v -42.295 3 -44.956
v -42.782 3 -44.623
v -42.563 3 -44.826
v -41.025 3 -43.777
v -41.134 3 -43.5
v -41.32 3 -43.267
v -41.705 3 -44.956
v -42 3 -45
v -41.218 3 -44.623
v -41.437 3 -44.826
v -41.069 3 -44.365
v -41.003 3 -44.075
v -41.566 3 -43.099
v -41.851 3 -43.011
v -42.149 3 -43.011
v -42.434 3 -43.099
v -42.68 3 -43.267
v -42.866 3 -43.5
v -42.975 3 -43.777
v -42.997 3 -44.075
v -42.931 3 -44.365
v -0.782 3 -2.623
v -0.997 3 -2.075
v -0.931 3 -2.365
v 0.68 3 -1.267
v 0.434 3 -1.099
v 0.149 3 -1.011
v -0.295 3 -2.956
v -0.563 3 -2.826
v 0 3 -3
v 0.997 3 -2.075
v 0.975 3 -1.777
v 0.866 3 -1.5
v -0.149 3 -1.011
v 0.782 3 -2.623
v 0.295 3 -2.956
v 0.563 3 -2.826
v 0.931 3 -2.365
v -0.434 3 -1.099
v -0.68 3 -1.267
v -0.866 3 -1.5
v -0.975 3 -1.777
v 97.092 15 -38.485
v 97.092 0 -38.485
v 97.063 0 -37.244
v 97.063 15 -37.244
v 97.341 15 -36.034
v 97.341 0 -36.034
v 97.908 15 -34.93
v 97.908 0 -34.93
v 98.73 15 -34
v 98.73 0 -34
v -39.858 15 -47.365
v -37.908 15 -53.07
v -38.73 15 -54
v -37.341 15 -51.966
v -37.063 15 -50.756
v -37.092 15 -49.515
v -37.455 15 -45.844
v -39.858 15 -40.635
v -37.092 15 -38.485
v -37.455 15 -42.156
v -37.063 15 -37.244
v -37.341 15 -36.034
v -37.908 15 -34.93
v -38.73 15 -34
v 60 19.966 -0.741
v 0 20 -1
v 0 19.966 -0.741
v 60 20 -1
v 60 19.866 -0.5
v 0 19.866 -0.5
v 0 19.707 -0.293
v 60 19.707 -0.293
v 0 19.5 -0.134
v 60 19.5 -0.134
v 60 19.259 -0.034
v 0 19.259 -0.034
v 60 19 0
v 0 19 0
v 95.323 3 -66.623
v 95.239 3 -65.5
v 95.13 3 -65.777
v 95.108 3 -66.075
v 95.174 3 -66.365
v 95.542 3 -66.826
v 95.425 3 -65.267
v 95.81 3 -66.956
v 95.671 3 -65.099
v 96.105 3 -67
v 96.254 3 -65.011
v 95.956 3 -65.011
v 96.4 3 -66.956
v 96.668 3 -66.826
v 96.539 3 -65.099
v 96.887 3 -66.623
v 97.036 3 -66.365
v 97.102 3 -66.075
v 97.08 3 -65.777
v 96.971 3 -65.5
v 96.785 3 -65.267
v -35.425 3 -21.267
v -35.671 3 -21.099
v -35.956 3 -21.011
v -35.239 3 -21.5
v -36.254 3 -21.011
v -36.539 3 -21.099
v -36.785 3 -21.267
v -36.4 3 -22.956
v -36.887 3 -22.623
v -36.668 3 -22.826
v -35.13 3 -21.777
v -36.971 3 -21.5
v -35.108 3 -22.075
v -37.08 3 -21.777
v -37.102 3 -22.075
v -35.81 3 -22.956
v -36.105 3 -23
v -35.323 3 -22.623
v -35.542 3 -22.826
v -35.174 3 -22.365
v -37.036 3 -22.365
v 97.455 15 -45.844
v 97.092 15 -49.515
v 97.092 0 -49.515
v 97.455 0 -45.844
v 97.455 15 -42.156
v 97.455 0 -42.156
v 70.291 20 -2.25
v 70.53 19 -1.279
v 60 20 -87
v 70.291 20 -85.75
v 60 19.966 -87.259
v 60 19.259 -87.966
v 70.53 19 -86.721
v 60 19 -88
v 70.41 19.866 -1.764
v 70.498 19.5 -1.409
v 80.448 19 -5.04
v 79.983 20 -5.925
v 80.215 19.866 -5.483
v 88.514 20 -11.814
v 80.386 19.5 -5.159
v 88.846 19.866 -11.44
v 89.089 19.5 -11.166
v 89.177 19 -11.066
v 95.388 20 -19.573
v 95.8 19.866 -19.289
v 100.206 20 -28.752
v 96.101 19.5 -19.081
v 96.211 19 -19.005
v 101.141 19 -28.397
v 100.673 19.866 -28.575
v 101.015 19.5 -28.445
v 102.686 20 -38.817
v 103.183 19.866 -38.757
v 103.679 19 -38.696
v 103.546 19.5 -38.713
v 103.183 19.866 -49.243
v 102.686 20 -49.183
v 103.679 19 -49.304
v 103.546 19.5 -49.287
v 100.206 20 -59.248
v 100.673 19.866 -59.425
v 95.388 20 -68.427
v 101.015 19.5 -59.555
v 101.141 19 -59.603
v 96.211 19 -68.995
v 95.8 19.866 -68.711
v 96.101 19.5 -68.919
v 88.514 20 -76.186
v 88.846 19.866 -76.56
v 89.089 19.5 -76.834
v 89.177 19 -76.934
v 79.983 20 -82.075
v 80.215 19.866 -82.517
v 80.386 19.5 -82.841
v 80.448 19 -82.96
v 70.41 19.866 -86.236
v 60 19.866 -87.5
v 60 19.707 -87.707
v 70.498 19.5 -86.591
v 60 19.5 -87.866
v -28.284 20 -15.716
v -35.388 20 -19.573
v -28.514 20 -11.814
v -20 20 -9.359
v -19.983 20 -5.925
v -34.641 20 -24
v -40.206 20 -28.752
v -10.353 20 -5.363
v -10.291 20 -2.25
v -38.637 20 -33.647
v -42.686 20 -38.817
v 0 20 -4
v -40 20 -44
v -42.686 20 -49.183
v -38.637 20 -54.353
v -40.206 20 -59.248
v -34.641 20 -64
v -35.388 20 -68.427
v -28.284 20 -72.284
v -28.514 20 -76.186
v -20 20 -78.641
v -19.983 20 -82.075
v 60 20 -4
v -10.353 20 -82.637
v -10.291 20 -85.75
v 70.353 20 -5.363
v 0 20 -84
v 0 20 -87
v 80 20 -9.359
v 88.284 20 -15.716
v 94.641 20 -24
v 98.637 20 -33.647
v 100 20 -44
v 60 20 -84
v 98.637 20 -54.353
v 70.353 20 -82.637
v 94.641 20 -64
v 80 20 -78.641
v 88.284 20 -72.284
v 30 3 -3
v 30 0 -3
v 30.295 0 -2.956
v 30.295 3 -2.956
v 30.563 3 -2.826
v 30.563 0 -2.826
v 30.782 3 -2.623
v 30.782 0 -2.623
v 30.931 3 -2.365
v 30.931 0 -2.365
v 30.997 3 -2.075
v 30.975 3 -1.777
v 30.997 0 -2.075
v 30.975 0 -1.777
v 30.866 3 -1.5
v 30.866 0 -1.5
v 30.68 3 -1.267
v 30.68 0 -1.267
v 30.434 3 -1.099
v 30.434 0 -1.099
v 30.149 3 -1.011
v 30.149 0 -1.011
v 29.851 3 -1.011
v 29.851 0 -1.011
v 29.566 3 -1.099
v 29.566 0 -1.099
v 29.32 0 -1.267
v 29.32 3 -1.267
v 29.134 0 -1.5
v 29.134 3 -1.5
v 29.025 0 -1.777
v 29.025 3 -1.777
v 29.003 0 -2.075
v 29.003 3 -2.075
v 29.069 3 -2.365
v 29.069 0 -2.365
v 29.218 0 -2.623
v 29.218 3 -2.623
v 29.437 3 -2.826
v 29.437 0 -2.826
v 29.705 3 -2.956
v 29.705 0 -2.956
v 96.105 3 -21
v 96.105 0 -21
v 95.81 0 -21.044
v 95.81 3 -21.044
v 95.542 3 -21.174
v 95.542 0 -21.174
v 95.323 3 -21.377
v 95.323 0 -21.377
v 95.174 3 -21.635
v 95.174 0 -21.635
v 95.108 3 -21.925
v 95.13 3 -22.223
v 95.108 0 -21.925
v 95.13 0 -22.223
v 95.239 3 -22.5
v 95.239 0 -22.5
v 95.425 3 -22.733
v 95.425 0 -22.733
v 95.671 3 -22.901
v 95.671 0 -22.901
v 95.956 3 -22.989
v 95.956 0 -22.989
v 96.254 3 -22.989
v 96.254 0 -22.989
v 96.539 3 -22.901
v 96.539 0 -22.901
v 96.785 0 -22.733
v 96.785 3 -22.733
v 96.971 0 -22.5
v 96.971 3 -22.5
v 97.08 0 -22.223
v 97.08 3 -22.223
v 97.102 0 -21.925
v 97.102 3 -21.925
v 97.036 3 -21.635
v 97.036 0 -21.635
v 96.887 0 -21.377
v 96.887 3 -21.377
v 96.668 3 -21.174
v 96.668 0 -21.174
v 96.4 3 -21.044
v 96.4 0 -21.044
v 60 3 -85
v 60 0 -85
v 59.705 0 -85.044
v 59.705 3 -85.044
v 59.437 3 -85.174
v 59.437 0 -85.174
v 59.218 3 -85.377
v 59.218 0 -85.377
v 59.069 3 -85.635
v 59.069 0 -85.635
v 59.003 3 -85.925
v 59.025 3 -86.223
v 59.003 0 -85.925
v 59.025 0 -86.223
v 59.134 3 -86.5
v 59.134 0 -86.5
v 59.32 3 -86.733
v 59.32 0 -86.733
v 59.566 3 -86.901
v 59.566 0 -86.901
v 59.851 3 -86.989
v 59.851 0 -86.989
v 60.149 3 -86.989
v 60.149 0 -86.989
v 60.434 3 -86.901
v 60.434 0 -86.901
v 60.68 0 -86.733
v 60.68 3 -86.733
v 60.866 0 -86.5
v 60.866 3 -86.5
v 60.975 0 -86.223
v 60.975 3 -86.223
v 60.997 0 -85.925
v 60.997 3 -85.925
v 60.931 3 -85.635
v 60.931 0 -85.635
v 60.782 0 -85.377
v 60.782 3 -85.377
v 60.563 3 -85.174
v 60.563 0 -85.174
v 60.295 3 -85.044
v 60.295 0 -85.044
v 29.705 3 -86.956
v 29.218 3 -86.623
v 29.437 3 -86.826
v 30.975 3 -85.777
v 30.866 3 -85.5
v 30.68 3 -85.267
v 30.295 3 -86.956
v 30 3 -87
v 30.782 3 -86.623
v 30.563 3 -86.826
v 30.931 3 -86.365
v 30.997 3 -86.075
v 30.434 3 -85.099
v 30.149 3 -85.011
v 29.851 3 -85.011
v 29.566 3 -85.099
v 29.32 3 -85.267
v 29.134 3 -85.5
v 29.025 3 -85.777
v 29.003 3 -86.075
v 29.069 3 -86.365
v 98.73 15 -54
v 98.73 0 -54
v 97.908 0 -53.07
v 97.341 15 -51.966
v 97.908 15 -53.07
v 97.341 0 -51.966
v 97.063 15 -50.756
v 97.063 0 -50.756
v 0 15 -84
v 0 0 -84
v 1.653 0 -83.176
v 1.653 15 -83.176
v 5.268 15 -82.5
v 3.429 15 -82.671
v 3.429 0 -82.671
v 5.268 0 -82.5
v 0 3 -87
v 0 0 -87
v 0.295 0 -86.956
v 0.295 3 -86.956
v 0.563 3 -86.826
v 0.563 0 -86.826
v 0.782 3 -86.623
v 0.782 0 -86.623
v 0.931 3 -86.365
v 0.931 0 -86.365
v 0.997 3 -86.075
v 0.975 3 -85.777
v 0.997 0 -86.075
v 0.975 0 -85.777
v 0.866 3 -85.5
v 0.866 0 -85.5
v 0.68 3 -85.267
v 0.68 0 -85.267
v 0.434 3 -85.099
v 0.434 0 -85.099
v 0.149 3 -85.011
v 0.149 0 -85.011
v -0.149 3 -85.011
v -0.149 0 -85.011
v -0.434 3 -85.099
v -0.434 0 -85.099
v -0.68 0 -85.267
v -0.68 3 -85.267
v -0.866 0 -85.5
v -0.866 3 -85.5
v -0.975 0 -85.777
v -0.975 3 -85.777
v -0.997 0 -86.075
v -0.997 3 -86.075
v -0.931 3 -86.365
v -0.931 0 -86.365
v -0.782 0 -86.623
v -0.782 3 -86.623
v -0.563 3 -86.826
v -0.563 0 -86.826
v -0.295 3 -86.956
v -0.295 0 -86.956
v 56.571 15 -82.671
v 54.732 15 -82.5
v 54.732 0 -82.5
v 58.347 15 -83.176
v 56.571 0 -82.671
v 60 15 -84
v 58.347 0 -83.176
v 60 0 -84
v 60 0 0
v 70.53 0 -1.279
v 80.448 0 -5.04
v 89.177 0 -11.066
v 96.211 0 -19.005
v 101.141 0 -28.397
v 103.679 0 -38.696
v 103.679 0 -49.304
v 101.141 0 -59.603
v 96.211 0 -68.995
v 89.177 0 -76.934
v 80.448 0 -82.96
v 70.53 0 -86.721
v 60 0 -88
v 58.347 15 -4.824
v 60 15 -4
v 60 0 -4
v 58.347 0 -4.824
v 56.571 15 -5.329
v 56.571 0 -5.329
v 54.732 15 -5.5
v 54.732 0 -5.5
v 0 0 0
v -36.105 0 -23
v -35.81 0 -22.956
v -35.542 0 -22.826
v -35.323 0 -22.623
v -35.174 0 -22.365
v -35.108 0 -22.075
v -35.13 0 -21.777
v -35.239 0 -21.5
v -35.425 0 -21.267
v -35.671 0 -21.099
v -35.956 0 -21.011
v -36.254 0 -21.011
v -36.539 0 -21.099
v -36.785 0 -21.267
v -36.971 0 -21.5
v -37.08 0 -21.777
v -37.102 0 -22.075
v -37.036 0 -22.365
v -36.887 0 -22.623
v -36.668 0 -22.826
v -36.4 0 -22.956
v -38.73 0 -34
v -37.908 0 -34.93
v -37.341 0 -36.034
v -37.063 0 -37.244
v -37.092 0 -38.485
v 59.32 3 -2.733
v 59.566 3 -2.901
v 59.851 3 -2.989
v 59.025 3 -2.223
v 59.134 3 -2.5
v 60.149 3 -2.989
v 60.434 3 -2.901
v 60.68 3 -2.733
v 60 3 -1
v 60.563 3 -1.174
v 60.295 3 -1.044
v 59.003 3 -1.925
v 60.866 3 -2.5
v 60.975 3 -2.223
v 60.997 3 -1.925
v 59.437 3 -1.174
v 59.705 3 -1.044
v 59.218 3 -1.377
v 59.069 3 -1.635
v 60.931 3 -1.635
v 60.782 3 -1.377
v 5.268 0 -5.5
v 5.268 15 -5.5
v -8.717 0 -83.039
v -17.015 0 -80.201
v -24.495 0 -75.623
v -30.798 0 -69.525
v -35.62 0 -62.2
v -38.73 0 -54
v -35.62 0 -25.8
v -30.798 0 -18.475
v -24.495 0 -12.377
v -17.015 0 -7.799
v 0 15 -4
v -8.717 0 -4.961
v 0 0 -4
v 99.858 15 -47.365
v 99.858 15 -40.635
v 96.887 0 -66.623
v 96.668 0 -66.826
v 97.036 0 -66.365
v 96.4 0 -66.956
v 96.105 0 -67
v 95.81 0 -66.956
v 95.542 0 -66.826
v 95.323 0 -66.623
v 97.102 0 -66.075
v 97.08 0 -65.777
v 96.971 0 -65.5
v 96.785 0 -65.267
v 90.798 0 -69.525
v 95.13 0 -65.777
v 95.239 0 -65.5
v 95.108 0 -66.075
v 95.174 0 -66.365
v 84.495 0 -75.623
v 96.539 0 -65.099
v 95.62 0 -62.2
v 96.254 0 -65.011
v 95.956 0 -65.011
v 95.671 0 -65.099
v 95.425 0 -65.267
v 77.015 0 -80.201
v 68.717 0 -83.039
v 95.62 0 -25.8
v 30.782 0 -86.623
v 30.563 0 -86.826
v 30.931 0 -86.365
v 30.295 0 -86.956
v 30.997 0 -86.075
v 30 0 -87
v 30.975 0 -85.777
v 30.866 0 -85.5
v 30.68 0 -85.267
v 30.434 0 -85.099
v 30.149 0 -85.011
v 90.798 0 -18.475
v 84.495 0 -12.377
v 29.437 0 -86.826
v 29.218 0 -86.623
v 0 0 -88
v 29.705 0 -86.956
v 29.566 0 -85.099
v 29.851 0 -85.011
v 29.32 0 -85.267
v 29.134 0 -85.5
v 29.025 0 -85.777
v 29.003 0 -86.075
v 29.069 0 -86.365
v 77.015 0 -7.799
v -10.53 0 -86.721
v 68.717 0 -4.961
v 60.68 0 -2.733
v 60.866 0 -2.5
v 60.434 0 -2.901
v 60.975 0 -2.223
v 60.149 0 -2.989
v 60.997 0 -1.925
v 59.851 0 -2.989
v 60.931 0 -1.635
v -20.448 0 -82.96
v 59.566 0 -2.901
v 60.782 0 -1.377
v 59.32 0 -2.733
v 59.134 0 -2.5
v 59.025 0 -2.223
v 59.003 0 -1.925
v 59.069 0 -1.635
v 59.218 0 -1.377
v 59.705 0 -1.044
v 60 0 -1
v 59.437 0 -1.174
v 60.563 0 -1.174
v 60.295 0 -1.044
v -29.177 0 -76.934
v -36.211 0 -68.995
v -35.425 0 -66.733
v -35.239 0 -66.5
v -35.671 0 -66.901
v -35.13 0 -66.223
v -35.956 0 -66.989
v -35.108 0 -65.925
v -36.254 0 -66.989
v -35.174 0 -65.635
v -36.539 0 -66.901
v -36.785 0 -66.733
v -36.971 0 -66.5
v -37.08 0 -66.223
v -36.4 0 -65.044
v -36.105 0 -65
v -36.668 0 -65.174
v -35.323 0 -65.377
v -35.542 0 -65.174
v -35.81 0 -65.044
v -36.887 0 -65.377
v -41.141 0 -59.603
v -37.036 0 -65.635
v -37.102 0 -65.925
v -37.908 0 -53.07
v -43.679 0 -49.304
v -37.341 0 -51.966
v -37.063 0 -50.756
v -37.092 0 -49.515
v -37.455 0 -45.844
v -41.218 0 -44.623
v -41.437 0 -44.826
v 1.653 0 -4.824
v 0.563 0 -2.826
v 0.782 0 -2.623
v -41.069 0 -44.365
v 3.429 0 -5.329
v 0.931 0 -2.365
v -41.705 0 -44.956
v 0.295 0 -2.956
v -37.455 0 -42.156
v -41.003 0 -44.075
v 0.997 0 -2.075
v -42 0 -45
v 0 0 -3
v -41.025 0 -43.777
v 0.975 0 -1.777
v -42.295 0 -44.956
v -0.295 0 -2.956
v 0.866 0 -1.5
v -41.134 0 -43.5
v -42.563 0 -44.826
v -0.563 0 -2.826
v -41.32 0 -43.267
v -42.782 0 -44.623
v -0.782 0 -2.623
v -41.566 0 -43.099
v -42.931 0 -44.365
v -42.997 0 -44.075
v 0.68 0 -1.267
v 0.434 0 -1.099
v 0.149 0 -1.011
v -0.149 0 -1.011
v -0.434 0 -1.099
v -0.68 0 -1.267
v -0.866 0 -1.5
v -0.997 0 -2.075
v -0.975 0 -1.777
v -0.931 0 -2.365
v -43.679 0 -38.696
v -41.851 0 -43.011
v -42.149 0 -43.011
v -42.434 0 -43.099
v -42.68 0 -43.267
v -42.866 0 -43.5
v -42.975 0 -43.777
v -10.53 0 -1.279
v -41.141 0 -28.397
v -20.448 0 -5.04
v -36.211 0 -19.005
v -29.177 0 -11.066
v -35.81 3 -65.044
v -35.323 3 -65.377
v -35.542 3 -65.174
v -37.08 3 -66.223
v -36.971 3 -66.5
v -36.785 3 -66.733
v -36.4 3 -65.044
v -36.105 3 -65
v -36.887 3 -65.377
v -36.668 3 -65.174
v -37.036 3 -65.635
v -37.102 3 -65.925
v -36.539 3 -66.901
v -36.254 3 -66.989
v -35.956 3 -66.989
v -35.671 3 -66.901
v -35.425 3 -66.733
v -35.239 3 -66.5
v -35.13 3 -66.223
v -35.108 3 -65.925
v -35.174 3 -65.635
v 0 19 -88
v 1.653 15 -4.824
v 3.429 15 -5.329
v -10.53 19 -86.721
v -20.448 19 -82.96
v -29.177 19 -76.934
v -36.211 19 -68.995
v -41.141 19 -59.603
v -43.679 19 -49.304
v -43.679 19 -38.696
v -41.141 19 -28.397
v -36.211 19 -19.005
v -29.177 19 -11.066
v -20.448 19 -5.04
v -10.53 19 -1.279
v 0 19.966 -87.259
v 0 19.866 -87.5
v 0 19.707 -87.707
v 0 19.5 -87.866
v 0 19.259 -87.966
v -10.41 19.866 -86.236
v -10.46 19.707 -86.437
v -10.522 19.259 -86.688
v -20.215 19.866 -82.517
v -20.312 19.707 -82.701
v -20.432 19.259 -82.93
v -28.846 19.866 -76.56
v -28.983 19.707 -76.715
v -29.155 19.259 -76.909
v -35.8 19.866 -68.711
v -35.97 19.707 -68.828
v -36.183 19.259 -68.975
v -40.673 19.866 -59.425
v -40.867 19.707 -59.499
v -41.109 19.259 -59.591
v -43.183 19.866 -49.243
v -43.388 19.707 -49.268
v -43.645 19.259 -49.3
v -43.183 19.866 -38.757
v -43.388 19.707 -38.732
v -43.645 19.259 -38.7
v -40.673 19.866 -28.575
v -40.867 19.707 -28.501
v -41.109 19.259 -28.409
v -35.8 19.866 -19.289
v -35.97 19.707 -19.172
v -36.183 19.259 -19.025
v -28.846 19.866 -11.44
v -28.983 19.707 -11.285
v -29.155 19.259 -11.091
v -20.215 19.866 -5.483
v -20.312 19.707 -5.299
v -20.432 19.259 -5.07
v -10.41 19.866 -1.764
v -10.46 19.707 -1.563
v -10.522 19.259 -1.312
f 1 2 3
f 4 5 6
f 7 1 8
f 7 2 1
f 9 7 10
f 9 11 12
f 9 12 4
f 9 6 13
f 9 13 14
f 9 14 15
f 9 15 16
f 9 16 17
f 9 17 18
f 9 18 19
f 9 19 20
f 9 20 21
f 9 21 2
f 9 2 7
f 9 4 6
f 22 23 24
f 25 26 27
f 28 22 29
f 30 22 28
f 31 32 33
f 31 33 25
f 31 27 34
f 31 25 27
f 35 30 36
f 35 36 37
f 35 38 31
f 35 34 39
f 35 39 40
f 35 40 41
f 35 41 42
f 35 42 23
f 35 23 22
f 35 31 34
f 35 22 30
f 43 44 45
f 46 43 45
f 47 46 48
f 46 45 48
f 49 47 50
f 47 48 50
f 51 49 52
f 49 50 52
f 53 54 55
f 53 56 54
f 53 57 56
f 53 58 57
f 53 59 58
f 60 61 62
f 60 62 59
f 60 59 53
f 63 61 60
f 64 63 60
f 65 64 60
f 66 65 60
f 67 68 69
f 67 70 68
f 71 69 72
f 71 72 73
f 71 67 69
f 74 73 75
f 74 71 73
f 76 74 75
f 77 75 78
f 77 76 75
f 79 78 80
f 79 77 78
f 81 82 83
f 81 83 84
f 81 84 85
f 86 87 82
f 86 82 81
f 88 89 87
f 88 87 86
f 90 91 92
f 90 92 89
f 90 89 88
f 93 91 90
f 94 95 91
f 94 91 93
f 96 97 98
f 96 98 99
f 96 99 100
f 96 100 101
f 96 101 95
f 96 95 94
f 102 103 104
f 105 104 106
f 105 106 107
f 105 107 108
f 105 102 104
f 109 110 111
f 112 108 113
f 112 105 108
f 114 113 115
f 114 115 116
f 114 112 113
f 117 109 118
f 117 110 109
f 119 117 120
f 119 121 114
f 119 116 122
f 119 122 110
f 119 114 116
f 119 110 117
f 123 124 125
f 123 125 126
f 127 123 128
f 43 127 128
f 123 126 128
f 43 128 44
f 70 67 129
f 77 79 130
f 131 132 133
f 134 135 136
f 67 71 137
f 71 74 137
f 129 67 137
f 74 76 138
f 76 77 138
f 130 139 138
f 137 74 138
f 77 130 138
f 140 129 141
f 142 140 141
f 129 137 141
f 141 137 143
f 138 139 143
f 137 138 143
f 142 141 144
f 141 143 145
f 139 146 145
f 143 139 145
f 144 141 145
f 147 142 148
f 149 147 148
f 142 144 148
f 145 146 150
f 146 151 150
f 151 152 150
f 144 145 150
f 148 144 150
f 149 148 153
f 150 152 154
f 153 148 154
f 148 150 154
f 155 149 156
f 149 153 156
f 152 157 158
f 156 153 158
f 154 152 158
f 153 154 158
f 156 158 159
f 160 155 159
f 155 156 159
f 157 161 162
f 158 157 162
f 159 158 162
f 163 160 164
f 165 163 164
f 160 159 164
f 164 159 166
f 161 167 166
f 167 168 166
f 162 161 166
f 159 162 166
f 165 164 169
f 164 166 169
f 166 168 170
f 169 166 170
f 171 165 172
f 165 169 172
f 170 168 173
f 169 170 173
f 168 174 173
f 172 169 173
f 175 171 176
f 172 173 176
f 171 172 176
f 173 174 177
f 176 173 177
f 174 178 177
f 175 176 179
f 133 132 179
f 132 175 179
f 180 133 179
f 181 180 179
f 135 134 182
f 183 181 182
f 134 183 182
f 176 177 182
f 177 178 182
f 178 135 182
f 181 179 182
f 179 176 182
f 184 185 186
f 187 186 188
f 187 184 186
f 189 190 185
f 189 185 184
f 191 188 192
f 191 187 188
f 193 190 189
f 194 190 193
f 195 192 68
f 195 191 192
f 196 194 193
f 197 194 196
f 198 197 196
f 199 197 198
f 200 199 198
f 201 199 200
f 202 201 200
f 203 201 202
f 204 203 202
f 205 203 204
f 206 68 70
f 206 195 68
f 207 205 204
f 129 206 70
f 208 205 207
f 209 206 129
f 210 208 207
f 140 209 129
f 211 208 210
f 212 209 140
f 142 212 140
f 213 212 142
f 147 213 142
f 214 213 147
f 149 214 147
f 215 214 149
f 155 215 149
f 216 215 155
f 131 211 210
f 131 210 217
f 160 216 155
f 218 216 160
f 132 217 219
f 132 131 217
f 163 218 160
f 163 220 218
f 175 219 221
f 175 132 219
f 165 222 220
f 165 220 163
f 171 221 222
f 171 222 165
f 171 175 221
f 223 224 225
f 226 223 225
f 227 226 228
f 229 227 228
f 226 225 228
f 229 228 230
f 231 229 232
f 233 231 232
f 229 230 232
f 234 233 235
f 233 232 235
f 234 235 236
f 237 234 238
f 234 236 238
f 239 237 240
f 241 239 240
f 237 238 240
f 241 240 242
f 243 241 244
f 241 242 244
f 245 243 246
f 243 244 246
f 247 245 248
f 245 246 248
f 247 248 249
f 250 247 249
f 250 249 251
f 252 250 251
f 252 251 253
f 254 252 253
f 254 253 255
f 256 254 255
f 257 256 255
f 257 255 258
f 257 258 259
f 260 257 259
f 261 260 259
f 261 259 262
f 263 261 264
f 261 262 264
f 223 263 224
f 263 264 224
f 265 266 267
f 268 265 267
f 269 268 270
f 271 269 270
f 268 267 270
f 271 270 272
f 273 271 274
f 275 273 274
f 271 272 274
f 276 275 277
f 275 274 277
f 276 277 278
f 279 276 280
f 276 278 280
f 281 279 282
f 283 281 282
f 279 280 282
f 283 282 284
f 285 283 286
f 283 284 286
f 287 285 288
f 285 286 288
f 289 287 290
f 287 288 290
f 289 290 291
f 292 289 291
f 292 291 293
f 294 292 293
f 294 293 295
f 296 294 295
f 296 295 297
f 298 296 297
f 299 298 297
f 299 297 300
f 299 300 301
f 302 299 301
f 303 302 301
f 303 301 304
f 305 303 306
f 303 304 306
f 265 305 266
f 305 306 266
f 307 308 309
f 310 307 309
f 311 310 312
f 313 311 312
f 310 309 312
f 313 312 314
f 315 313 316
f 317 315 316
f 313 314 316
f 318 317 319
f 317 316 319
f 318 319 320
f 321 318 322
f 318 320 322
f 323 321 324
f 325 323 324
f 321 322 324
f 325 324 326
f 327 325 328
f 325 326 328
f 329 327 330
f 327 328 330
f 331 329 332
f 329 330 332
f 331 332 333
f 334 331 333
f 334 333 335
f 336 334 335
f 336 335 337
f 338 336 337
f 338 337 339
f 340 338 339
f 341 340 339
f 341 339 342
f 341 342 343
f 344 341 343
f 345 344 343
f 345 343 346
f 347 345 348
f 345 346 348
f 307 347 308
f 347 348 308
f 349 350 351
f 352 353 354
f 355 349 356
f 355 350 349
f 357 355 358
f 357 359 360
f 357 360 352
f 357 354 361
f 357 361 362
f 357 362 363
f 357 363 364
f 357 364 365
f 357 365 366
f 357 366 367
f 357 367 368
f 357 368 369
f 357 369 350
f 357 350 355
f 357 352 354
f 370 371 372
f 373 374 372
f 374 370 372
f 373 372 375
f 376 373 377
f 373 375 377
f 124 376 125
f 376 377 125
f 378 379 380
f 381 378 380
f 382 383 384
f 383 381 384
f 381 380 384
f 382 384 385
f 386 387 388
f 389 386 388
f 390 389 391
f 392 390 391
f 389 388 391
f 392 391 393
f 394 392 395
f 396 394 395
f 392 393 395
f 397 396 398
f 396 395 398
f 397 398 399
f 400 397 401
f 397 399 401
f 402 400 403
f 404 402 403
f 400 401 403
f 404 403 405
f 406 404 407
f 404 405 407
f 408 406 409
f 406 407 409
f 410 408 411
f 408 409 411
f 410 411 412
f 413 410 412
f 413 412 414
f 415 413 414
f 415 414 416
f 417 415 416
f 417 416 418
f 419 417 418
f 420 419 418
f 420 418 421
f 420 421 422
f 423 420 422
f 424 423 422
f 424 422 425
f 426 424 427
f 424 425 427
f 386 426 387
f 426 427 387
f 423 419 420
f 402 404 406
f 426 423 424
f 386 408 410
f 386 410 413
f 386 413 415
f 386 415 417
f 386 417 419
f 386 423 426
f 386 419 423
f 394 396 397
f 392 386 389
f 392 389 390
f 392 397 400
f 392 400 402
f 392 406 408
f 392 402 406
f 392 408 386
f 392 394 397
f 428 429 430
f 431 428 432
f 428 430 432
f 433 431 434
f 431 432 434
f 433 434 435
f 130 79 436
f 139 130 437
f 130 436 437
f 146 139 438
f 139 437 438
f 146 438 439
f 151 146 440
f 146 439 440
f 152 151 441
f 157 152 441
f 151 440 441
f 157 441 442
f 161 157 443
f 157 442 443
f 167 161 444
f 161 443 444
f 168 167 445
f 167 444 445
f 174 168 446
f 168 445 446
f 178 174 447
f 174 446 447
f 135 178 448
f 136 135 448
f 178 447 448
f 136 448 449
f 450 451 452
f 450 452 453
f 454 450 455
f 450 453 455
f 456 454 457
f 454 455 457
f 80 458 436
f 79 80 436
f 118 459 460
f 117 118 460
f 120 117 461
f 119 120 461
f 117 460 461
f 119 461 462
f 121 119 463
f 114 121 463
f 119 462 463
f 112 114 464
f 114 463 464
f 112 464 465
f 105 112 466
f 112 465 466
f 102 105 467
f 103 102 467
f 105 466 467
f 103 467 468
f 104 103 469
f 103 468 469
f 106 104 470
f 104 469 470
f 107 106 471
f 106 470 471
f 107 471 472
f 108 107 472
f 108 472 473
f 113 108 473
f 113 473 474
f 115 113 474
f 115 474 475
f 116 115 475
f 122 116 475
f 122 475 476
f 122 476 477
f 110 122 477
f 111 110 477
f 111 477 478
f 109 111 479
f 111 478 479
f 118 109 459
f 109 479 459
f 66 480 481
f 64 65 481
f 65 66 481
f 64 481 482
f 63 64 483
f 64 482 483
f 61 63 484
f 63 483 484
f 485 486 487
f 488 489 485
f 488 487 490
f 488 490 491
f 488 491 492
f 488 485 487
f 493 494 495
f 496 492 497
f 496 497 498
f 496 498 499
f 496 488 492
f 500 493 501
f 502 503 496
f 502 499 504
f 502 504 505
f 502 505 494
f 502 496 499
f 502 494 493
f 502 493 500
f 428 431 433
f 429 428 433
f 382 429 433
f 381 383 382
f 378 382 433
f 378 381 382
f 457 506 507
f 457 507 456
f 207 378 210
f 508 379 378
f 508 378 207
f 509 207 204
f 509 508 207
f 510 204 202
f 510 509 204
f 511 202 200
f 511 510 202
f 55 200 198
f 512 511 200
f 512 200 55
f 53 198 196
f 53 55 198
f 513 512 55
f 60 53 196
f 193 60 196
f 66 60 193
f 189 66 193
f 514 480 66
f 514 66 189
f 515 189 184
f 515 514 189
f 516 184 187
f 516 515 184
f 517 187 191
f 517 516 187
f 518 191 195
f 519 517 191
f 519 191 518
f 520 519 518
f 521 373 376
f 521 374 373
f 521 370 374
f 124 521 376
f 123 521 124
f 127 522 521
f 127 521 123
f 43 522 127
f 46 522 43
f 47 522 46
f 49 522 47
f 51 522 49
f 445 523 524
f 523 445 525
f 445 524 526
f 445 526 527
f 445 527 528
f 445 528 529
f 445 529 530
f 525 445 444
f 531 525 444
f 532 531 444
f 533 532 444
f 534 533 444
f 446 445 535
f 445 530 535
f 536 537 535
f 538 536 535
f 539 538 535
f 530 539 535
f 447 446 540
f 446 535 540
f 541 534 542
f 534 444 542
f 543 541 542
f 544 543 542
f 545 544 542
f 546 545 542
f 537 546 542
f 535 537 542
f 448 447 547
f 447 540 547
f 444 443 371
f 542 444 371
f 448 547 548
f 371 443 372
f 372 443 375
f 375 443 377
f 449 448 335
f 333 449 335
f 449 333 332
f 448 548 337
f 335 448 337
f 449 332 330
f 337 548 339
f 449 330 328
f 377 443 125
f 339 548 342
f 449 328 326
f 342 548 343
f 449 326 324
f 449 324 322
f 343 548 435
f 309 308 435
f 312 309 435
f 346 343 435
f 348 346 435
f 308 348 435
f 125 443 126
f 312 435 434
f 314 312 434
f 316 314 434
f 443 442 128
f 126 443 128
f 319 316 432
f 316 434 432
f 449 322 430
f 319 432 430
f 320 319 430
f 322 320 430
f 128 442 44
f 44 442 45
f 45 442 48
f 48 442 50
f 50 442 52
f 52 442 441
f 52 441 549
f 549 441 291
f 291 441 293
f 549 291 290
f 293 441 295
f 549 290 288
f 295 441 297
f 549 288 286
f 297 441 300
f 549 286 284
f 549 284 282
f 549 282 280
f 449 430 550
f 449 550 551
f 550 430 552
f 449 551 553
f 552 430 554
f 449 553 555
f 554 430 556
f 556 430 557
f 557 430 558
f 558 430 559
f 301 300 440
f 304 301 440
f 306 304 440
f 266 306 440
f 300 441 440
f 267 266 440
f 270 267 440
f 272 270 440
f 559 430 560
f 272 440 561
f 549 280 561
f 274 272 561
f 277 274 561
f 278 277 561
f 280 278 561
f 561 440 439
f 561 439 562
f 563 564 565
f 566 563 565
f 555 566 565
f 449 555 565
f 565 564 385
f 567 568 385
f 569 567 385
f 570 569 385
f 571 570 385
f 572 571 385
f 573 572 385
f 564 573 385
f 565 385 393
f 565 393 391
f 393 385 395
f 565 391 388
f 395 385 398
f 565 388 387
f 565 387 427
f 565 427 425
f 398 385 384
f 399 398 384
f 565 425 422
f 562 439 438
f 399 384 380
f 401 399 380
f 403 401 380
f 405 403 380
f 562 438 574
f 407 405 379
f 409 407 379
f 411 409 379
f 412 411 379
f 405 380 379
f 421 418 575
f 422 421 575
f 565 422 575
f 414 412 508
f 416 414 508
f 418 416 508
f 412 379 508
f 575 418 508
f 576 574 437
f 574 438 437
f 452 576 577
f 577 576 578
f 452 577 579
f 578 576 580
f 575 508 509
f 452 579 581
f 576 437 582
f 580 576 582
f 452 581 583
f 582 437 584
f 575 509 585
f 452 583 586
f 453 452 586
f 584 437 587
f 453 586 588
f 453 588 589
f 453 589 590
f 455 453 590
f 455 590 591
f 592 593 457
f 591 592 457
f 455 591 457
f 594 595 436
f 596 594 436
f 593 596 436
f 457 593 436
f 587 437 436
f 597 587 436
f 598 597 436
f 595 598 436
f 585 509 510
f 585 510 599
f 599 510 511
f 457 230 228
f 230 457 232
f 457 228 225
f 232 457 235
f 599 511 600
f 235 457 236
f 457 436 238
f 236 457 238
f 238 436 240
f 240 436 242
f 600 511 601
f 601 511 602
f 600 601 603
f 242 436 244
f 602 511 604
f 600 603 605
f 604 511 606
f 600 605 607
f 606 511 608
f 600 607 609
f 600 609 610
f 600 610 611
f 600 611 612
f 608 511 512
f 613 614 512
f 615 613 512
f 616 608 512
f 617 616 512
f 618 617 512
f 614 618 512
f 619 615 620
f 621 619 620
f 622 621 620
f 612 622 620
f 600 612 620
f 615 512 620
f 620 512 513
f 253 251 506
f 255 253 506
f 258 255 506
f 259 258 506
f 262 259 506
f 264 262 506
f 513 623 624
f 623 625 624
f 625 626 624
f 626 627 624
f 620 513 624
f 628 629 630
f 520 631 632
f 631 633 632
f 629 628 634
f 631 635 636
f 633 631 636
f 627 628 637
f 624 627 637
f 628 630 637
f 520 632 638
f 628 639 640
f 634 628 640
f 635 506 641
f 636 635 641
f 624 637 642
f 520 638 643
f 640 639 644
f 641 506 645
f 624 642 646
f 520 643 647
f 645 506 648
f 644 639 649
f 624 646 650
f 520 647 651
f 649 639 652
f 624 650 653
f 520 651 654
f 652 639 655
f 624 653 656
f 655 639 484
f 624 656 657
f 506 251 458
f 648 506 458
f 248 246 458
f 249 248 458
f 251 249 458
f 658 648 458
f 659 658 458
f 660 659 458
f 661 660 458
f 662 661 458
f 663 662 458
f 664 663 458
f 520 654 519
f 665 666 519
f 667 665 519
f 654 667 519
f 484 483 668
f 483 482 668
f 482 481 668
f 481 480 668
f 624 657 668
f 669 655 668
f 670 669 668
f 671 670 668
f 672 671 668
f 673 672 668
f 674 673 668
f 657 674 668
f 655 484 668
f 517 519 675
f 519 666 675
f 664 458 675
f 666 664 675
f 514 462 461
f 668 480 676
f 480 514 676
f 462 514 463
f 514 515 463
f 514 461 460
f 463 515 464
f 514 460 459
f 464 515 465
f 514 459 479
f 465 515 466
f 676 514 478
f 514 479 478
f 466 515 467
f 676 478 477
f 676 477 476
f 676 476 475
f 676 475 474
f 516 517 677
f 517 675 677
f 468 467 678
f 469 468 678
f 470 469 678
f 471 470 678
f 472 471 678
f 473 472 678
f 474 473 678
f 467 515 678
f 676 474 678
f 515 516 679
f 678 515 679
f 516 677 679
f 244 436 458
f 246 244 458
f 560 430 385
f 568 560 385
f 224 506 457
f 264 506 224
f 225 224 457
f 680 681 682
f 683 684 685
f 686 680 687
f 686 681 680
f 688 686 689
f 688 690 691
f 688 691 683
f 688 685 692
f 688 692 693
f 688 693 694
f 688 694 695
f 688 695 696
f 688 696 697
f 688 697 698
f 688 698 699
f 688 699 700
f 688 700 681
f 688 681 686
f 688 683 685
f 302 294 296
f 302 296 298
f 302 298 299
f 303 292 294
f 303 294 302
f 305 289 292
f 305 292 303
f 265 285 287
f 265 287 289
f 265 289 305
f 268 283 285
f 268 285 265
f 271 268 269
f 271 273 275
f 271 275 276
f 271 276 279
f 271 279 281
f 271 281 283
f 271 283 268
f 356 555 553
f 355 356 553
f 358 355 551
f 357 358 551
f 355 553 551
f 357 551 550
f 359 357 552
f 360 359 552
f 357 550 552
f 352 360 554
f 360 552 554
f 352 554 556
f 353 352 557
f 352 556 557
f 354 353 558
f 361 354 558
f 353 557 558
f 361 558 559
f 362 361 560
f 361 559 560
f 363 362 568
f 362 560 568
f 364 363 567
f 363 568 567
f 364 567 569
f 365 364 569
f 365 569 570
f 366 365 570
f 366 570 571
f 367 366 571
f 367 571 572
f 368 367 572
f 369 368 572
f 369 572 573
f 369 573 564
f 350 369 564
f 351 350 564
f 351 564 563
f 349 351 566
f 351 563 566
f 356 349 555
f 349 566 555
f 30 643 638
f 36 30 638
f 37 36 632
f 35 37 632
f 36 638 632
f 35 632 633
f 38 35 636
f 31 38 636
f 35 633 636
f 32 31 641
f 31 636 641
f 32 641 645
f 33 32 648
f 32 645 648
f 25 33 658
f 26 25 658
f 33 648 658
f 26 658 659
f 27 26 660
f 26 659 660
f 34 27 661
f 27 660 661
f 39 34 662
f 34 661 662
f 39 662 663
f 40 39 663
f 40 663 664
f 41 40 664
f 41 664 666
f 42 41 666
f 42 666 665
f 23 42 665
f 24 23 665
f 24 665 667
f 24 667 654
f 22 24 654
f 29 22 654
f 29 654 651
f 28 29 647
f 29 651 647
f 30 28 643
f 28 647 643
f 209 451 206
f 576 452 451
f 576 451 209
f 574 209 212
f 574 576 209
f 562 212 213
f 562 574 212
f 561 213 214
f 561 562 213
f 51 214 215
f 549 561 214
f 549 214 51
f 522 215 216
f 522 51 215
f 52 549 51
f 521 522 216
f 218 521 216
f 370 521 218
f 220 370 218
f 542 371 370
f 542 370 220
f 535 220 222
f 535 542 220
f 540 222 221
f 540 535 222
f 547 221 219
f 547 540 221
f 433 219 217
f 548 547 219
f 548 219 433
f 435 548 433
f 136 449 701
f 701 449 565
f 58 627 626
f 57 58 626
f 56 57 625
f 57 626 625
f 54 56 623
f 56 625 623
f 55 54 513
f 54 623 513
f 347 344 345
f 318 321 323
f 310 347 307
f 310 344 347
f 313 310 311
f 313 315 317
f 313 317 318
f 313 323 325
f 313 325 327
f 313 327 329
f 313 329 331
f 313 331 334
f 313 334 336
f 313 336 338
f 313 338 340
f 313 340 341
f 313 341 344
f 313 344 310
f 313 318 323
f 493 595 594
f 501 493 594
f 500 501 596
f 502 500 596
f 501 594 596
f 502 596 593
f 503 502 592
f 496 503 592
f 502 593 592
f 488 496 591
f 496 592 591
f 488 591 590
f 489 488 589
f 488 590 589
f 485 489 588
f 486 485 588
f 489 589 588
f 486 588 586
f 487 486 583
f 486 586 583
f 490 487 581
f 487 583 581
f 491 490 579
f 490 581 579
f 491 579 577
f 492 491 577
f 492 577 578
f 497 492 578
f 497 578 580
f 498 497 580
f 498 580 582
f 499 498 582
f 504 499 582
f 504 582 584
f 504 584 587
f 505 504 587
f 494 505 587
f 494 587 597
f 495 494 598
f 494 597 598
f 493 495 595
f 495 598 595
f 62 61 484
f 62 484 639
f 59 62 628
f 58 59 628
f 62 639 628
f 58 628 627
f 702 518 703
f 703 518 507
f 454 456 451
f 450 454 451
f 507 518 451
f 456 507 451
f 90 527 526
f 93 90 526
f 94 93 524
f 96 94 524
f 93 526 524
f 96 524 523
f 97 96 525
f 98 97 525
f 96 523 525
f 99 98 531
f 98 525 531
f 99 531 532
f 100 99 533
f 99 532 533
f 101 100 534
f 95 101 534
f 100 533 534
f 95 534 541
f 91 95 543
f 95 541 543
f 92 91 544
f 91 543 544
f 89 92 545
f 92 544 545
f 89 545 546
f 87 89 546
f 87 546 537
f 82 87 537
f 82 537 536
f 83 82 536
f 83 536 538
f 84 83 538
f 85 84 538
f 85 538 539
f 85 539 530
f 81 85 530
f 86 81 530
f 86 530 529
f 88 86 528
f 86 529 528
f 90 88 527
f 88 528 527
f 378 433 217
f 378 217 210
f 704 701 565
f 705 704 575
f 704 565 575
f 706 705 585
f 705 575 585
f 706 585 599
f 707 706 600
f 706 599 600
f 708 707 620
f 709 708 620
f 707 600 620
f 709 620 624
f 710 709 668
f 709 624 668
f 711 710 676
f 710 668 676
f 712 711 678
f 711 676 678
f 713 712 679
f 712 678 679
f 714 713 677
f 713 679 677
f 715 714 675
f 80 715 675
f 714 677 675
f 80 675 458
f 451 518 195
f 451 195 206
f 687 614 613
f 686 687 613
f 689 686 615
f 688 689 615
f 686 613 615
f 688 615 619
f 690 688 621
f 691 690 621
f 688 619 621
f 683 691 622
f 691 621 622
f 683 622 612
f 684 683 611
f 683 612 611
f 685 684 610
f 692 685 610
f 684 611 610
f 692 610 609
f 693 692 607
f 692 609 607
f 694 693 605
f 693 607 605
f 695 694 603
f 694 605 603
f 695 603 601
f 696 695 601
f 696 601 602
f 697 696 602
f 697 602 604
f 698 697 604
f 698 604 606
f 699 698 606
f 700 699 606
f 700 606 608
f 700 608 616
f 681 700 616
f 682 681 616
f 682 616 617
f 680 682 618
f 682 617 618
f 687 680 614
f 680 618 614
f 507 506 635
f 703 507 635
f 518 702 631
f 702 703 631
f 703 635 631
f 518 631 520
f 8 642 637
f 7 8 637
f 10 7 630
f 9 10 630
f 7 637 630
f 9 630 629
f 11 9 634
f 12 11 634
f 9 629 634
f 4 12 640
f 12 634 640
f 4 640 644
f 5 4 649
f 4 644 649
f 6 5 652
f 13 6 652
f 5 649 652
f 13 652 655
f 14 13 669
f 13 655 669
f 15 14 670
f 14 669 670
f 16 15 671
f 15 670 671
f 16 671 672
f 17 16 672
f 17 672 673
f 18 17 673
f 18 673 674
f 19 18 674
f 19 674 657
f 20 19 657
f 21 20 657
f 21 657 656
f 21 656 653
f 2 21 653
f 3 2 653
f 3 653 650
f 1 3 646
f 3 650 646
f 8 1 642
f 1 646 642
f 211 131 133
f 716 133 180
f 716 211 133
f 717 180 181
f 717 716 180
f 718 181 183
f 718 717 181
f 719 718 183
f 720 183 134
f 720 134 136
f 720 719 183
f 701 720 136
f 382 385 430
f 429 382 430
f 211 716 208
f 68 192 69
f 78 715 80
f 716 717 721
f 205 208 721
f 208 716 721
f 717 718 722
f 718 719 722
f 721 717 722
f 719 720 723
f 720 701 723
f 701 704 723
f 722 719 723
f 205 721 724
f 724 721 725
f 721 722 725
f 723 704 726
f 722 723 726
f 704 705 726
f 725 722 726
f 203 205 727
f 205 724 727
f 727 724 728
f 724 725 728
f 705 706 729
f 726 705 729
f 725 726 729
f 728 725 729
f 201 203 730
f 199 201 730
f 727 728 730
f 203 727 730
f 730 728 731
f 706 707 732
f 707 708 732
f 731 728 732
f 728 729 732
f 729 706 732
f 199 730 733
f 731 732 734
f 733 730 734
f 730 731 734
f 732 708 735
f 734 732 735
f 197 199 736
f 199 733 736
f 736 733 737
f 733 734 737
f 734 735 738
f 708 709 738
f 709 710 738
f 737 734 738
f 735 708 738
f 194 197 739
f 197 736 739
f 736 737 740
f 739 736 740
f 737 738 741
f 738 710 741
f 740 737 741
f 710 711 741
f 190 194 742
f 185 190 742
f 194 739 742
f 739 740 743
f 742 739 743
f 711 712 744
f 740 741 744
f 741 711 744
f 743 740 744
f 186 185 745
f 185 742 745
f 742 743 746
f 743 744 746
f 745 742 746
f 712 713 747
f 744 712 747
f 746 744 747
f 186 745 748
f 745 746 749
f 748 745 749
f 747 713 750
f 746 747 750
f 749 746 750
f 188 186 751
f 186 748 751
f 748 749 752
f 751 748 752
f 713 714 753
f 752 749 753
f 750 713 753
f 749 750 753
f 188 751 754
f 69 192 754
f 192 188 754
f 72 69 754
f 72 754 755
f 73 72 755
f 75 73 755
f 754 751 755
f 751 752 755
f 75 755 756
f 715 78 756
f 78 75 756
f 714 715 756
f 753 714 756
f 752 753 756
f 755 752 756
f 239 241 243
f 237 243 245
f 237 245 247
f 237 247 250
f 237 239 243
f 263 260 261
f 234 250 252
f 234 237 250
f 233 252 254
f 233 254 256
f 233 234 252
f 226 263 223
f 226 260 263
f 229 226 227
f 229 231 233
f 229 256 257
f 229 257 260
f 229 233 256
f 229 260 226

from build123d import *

# Parameters (mm, degrees)
BOSS_EXTRUDE1_DEPTH = 20
SHELL1_T            = -4
SKETCH3_W           = 60
SKETCH3_H           = 1.5
BOSS_EXTRUDE2_DEPTH = 15
BOSS_EXTRUDE3_DEPTH = 15
FILLET2_R           = 10
BOSS_EXTRUDE5_DEPTH = 15
FILLET5_R           = 5
FILLET6_R           = 1
SKETCH7_R           = 1
CUT_EXTRUDE1_DEPTH  = 3


with BuildPart() as part:
    # Sketch1 → Boss-Extrude1 (new body)
    with BuildSketch(Plane(origin=(0, 0, 0), x_dir=(1, 0, 0), z_dir=(0, 1, 0))):
        with BuildLine():
            Line((0, 0), (60, 0))
            ThreePointArc((60, 0), (104, 44), (60, 88))
            Line((60, 88), (0, 88))
            ThreePointArc((0, 88), (-44, 44), (0, 0))
        make_face()
    extrude(amount=BOSS_EXTRUDE1_DEPTH)

    # Shell1
    shell1_openings = [part.faces().sort_by_distance(p)[0] for p in [
        (30, 20, -44),
        (30, 0, -44),
    ]]
    offset(amount=SHELL1_T, openings=shell1_openings, kind=Kind.INTERSECTION)

    # Sketch3 → Boss-Extrude2 (add)
    with BuildSketch(Plane.XZ):
        with Locations((30, -4.75)):
            Rectangle(SKETCH3_W, SKETCH3_H)
    extrude(amount=-BOSS_EXTRUDE2_DEPTH)

    # Sketch5 → Boss-Extrude3 (add)
    with BuildSketch(Plane.XZ):
        Polygon((0, -84), (0, -82.5), (60.003782522, -82.5), (60, -84), align=None)
    extrude(amount=-BOSS_EXTRUDE3_DEPTH)

    # Fillet2
    # the kernel refuses this fillet: 10 mm, written as the material it takes off along each edge
    with BuildSketch(Plane(origin=(60, -13.169567191, -5.5), x_dir=(0, 0, 1), z_dir=(0, 1, 0)), Plane(origin=(0, -13.169567191, -82.5), x_dir=(0, 0, -1), z_dir=(0, 1, 0))) as fillet2_piece_1:
        with BuildLine():
            CenterArc((10, -5.267826876), FILLET2_R, 148.211669383, 31.788330617)
            Line((0, -5.267826876), (-0.2, -5.267826876))
            Line((-0.2, -5.267826876), (-0.2, 0))
            Line((-0.2, 0), (0, 0.2))
            ThreePointArc((0, 0.2), (0.75, 0.2), (1.33, 0.105356538))
            Line((1.33, 0.105356538), (1.5, 0))
        make_face()
    extrude(amount=41.339134382, mode=Mode.SUBTRACT)
    with BuildSketch(Plane(origin=(60.003782522, -13.179023495, -82.5), x_dir=(-1, 0, 0), z_dir=(0, 1, 0))) as fillet2_piece_2:
        with BuildLine():
            CenterArc((5.271609398, -10), FILLET2_R, 90, 31.788330617)
            Line((0.003782522, -1.5), (-0.101574016, -1.33))
            ThreePointArc((-0.101574016, -1.33), (-0.198108103, -0.750504335), (-0.199999364, -0.000504335))
            Line((-0.199999364, -0.000504335), (0, 0.2))
            Line((0, 0.2), (5.271609398, 0.2))
            Line((5.271609398, 0.2), (5.271609398, 0))
        make_face()
    extrude(amount=41.358046991, mode=Mode.SUBTRACT)
    with BuildSketch(Plane(origin=(0, -13.169567191, -5.5), x_dir=(1, 0, 0), z_dir=(0, 1, 0))) as fillet2_piece_3:
        with BuildLine():
            CenterArc((5.267826876, -10), FILLET2_R, 90, 31.788330617)
            Line((0, -1.5), (-0.105356538, -1.33))
            ThreePointArc((-0.105356538, -1.33), (-0.2, -0.75), (-0.2, 0))
            Line((-0.2, 0), (0, 0.2))
            Line((0, 0.2), (5.267826876, 0.2))
            Line((5.267826876, 0.2), (5.267826876, 0))
        make_face()
    extrude(amount=41.339134382, mode=Mode.SUBTRACT)

    # Sketch8 → Boss-Extrude5 (add)
    with BuildSketch(Plane.XZ):
        with BuildLine():
            Line((96.142080737, -34), (98.729833462, -34))
            ThreePointArc((98.729833462, -34), (100, -44), (98.729833462, -54))
            Line((98.729833462, -54), (96.142080737, -54))
            ThreePointArc((96.142080737, -54), (97.5, -44), (96.142080737, -34))
        make_face()
        with BuildLine():
            Line((-36.142080737, -54), (-38.729833462, -54))
            ThreePointArc((-38.729833462, -54), (-40, -44), (-38.729833462, -34))
            Line((-38.729833462, -34), (-36.142080737, -34))
            ThreePointArc((-36.142080737, -34), (-37.5, -44), (-36.142080737, -54))
        make_face()
    extrude(amount=-BOSS_EXTRUDE5_DEPTH)

    # Fillet5
    # the kernel refuses this fillet: 5 mm, written as the material it takes off along each edge
    with BuildSketch(Plane(origin=(96.142080737, -11.460527233, -34), x_dir=(1, 0, 0), z_dir=(0, 1, 0)), Plane(origin=(-36.142080737, -11.460527233, -54), x_dir=(-1, 0, 0), z_dir=(0, 1, 0))) as fillet5_piece_1:
        with BuildLine():
            CenterArc((5.895743435, 3.749292929), FILLET5_R, 171.542516957, 57.035612676)
            Line((0.950117062, 4.484670231), (0.851204534, 4.499377777))
            ThreePointArc((0.851204534, 4.499377777), (0.445822951, 2.248528932), (-0.096378882, 0.026666667))
            Line((-0.096378882, 0.026666667), (0, -0.1))
            ThreePointArc((0, -0.1), (1.293876363, -0.1), (2.521592911, -0.074985859))
            Line((2.521592911, -0.074985859), (2.587752725, 0))
        make_face()
    extrude(amount=37.921054465, mode=Mode.SUBTRACT)
    with BuildSketch(Plane(origin=(96.142080737, -11.460527233, -54), x_dir=(1, 0, 0), z_dir=(0, 1, 0)), Plane(origin=(-36.142080737, -11.460527233, -34), x_dir=(-1, 0, 0), z_dir=(0, 1, 0))) as fillet5_piece_2:
        with BuildLine():
            CenterArc((5.895743435, -3.749292929), FILLET5_R, 131.421870366, 57.035612676)
            Line((0.950117062, -4.484670231), (0.851204534, -4.499377777))
            ThreePointArc((0.851204534, -4.499377777), (0.445822951, -2.248528932), (-0.096378882, -0.026666667))
            Line((-0.096378882, -0.026666667), (0, 0.1))
            ThreePointArc((0, 0.1), (1.293876363, 0.1), (2.521592911, 0.074985859))
            Line((2.521592911, 0.074985859), (2.587752725, 0))
        make_face()
    extrude(amount=37.921054465, mode=Mode.SUBTRACT)

    # Fillet6
    fillet6_edges = [part.edges().sort_by_distance(p)[0] for p in [
        (104, 20, -44),
        (30, 20, -88),
        (-44, 20, -44),
        (30, 20, 0),
    ]]
    fillet(fillet6_edges, radius=FILLET6_R)

    # Sketch7 → Cut-Extrude1 (cut)
    with BuildSketch(Plane.XZ):
        with Locations(Location((-42, -44, 0), (0, 0, 270))):
            Circle(SKETCH7_R)
        with Locations(Location((-36.105117767, -22, 0), (0, 0, 270))):
            Circle(SKETCH7_R)
        with Locations(Location((-36.105117767, -66, 0), (0, 0, 90))):
            Circle(SKETCH7_R)
        with Locations(Location((0, -2, 0), (0, 0, 270))):
            Circle(SKETCH7_R)
        with Locations(Location((30, -2, 0), (0, 0, 270))):
            Circle(SKETCH7_R)
        with Locations(Location((0, -86, 0), (0, 0, 270))):
            Circle(SKETCH7_R)
        with Locations(Location((30, -86, 0), (0, 0, 270))):
            Circle(SKETCH7_R)
        with Locations(Location((96.105117767, -22, 0), (0, 0, 90))):
            Circle(SKETCH7_R)
        with Locations(Location((96.105117767, -66, 0), (0, 0, 270))):
            Circle(SKETCH7_R)
        with Locations(Location((60, -86, 0), (0, 0, 90))):
            Circle(SKETCH7_R)
        with Locations(Location((60, -2, 0), (0, 0, 90))):
            Circle(SKETCH7_R)
    extrude(amount=-CUT_EXTRUDE1_DEPTH, mode=Mode.SUBTRACT)


solid = part.part
